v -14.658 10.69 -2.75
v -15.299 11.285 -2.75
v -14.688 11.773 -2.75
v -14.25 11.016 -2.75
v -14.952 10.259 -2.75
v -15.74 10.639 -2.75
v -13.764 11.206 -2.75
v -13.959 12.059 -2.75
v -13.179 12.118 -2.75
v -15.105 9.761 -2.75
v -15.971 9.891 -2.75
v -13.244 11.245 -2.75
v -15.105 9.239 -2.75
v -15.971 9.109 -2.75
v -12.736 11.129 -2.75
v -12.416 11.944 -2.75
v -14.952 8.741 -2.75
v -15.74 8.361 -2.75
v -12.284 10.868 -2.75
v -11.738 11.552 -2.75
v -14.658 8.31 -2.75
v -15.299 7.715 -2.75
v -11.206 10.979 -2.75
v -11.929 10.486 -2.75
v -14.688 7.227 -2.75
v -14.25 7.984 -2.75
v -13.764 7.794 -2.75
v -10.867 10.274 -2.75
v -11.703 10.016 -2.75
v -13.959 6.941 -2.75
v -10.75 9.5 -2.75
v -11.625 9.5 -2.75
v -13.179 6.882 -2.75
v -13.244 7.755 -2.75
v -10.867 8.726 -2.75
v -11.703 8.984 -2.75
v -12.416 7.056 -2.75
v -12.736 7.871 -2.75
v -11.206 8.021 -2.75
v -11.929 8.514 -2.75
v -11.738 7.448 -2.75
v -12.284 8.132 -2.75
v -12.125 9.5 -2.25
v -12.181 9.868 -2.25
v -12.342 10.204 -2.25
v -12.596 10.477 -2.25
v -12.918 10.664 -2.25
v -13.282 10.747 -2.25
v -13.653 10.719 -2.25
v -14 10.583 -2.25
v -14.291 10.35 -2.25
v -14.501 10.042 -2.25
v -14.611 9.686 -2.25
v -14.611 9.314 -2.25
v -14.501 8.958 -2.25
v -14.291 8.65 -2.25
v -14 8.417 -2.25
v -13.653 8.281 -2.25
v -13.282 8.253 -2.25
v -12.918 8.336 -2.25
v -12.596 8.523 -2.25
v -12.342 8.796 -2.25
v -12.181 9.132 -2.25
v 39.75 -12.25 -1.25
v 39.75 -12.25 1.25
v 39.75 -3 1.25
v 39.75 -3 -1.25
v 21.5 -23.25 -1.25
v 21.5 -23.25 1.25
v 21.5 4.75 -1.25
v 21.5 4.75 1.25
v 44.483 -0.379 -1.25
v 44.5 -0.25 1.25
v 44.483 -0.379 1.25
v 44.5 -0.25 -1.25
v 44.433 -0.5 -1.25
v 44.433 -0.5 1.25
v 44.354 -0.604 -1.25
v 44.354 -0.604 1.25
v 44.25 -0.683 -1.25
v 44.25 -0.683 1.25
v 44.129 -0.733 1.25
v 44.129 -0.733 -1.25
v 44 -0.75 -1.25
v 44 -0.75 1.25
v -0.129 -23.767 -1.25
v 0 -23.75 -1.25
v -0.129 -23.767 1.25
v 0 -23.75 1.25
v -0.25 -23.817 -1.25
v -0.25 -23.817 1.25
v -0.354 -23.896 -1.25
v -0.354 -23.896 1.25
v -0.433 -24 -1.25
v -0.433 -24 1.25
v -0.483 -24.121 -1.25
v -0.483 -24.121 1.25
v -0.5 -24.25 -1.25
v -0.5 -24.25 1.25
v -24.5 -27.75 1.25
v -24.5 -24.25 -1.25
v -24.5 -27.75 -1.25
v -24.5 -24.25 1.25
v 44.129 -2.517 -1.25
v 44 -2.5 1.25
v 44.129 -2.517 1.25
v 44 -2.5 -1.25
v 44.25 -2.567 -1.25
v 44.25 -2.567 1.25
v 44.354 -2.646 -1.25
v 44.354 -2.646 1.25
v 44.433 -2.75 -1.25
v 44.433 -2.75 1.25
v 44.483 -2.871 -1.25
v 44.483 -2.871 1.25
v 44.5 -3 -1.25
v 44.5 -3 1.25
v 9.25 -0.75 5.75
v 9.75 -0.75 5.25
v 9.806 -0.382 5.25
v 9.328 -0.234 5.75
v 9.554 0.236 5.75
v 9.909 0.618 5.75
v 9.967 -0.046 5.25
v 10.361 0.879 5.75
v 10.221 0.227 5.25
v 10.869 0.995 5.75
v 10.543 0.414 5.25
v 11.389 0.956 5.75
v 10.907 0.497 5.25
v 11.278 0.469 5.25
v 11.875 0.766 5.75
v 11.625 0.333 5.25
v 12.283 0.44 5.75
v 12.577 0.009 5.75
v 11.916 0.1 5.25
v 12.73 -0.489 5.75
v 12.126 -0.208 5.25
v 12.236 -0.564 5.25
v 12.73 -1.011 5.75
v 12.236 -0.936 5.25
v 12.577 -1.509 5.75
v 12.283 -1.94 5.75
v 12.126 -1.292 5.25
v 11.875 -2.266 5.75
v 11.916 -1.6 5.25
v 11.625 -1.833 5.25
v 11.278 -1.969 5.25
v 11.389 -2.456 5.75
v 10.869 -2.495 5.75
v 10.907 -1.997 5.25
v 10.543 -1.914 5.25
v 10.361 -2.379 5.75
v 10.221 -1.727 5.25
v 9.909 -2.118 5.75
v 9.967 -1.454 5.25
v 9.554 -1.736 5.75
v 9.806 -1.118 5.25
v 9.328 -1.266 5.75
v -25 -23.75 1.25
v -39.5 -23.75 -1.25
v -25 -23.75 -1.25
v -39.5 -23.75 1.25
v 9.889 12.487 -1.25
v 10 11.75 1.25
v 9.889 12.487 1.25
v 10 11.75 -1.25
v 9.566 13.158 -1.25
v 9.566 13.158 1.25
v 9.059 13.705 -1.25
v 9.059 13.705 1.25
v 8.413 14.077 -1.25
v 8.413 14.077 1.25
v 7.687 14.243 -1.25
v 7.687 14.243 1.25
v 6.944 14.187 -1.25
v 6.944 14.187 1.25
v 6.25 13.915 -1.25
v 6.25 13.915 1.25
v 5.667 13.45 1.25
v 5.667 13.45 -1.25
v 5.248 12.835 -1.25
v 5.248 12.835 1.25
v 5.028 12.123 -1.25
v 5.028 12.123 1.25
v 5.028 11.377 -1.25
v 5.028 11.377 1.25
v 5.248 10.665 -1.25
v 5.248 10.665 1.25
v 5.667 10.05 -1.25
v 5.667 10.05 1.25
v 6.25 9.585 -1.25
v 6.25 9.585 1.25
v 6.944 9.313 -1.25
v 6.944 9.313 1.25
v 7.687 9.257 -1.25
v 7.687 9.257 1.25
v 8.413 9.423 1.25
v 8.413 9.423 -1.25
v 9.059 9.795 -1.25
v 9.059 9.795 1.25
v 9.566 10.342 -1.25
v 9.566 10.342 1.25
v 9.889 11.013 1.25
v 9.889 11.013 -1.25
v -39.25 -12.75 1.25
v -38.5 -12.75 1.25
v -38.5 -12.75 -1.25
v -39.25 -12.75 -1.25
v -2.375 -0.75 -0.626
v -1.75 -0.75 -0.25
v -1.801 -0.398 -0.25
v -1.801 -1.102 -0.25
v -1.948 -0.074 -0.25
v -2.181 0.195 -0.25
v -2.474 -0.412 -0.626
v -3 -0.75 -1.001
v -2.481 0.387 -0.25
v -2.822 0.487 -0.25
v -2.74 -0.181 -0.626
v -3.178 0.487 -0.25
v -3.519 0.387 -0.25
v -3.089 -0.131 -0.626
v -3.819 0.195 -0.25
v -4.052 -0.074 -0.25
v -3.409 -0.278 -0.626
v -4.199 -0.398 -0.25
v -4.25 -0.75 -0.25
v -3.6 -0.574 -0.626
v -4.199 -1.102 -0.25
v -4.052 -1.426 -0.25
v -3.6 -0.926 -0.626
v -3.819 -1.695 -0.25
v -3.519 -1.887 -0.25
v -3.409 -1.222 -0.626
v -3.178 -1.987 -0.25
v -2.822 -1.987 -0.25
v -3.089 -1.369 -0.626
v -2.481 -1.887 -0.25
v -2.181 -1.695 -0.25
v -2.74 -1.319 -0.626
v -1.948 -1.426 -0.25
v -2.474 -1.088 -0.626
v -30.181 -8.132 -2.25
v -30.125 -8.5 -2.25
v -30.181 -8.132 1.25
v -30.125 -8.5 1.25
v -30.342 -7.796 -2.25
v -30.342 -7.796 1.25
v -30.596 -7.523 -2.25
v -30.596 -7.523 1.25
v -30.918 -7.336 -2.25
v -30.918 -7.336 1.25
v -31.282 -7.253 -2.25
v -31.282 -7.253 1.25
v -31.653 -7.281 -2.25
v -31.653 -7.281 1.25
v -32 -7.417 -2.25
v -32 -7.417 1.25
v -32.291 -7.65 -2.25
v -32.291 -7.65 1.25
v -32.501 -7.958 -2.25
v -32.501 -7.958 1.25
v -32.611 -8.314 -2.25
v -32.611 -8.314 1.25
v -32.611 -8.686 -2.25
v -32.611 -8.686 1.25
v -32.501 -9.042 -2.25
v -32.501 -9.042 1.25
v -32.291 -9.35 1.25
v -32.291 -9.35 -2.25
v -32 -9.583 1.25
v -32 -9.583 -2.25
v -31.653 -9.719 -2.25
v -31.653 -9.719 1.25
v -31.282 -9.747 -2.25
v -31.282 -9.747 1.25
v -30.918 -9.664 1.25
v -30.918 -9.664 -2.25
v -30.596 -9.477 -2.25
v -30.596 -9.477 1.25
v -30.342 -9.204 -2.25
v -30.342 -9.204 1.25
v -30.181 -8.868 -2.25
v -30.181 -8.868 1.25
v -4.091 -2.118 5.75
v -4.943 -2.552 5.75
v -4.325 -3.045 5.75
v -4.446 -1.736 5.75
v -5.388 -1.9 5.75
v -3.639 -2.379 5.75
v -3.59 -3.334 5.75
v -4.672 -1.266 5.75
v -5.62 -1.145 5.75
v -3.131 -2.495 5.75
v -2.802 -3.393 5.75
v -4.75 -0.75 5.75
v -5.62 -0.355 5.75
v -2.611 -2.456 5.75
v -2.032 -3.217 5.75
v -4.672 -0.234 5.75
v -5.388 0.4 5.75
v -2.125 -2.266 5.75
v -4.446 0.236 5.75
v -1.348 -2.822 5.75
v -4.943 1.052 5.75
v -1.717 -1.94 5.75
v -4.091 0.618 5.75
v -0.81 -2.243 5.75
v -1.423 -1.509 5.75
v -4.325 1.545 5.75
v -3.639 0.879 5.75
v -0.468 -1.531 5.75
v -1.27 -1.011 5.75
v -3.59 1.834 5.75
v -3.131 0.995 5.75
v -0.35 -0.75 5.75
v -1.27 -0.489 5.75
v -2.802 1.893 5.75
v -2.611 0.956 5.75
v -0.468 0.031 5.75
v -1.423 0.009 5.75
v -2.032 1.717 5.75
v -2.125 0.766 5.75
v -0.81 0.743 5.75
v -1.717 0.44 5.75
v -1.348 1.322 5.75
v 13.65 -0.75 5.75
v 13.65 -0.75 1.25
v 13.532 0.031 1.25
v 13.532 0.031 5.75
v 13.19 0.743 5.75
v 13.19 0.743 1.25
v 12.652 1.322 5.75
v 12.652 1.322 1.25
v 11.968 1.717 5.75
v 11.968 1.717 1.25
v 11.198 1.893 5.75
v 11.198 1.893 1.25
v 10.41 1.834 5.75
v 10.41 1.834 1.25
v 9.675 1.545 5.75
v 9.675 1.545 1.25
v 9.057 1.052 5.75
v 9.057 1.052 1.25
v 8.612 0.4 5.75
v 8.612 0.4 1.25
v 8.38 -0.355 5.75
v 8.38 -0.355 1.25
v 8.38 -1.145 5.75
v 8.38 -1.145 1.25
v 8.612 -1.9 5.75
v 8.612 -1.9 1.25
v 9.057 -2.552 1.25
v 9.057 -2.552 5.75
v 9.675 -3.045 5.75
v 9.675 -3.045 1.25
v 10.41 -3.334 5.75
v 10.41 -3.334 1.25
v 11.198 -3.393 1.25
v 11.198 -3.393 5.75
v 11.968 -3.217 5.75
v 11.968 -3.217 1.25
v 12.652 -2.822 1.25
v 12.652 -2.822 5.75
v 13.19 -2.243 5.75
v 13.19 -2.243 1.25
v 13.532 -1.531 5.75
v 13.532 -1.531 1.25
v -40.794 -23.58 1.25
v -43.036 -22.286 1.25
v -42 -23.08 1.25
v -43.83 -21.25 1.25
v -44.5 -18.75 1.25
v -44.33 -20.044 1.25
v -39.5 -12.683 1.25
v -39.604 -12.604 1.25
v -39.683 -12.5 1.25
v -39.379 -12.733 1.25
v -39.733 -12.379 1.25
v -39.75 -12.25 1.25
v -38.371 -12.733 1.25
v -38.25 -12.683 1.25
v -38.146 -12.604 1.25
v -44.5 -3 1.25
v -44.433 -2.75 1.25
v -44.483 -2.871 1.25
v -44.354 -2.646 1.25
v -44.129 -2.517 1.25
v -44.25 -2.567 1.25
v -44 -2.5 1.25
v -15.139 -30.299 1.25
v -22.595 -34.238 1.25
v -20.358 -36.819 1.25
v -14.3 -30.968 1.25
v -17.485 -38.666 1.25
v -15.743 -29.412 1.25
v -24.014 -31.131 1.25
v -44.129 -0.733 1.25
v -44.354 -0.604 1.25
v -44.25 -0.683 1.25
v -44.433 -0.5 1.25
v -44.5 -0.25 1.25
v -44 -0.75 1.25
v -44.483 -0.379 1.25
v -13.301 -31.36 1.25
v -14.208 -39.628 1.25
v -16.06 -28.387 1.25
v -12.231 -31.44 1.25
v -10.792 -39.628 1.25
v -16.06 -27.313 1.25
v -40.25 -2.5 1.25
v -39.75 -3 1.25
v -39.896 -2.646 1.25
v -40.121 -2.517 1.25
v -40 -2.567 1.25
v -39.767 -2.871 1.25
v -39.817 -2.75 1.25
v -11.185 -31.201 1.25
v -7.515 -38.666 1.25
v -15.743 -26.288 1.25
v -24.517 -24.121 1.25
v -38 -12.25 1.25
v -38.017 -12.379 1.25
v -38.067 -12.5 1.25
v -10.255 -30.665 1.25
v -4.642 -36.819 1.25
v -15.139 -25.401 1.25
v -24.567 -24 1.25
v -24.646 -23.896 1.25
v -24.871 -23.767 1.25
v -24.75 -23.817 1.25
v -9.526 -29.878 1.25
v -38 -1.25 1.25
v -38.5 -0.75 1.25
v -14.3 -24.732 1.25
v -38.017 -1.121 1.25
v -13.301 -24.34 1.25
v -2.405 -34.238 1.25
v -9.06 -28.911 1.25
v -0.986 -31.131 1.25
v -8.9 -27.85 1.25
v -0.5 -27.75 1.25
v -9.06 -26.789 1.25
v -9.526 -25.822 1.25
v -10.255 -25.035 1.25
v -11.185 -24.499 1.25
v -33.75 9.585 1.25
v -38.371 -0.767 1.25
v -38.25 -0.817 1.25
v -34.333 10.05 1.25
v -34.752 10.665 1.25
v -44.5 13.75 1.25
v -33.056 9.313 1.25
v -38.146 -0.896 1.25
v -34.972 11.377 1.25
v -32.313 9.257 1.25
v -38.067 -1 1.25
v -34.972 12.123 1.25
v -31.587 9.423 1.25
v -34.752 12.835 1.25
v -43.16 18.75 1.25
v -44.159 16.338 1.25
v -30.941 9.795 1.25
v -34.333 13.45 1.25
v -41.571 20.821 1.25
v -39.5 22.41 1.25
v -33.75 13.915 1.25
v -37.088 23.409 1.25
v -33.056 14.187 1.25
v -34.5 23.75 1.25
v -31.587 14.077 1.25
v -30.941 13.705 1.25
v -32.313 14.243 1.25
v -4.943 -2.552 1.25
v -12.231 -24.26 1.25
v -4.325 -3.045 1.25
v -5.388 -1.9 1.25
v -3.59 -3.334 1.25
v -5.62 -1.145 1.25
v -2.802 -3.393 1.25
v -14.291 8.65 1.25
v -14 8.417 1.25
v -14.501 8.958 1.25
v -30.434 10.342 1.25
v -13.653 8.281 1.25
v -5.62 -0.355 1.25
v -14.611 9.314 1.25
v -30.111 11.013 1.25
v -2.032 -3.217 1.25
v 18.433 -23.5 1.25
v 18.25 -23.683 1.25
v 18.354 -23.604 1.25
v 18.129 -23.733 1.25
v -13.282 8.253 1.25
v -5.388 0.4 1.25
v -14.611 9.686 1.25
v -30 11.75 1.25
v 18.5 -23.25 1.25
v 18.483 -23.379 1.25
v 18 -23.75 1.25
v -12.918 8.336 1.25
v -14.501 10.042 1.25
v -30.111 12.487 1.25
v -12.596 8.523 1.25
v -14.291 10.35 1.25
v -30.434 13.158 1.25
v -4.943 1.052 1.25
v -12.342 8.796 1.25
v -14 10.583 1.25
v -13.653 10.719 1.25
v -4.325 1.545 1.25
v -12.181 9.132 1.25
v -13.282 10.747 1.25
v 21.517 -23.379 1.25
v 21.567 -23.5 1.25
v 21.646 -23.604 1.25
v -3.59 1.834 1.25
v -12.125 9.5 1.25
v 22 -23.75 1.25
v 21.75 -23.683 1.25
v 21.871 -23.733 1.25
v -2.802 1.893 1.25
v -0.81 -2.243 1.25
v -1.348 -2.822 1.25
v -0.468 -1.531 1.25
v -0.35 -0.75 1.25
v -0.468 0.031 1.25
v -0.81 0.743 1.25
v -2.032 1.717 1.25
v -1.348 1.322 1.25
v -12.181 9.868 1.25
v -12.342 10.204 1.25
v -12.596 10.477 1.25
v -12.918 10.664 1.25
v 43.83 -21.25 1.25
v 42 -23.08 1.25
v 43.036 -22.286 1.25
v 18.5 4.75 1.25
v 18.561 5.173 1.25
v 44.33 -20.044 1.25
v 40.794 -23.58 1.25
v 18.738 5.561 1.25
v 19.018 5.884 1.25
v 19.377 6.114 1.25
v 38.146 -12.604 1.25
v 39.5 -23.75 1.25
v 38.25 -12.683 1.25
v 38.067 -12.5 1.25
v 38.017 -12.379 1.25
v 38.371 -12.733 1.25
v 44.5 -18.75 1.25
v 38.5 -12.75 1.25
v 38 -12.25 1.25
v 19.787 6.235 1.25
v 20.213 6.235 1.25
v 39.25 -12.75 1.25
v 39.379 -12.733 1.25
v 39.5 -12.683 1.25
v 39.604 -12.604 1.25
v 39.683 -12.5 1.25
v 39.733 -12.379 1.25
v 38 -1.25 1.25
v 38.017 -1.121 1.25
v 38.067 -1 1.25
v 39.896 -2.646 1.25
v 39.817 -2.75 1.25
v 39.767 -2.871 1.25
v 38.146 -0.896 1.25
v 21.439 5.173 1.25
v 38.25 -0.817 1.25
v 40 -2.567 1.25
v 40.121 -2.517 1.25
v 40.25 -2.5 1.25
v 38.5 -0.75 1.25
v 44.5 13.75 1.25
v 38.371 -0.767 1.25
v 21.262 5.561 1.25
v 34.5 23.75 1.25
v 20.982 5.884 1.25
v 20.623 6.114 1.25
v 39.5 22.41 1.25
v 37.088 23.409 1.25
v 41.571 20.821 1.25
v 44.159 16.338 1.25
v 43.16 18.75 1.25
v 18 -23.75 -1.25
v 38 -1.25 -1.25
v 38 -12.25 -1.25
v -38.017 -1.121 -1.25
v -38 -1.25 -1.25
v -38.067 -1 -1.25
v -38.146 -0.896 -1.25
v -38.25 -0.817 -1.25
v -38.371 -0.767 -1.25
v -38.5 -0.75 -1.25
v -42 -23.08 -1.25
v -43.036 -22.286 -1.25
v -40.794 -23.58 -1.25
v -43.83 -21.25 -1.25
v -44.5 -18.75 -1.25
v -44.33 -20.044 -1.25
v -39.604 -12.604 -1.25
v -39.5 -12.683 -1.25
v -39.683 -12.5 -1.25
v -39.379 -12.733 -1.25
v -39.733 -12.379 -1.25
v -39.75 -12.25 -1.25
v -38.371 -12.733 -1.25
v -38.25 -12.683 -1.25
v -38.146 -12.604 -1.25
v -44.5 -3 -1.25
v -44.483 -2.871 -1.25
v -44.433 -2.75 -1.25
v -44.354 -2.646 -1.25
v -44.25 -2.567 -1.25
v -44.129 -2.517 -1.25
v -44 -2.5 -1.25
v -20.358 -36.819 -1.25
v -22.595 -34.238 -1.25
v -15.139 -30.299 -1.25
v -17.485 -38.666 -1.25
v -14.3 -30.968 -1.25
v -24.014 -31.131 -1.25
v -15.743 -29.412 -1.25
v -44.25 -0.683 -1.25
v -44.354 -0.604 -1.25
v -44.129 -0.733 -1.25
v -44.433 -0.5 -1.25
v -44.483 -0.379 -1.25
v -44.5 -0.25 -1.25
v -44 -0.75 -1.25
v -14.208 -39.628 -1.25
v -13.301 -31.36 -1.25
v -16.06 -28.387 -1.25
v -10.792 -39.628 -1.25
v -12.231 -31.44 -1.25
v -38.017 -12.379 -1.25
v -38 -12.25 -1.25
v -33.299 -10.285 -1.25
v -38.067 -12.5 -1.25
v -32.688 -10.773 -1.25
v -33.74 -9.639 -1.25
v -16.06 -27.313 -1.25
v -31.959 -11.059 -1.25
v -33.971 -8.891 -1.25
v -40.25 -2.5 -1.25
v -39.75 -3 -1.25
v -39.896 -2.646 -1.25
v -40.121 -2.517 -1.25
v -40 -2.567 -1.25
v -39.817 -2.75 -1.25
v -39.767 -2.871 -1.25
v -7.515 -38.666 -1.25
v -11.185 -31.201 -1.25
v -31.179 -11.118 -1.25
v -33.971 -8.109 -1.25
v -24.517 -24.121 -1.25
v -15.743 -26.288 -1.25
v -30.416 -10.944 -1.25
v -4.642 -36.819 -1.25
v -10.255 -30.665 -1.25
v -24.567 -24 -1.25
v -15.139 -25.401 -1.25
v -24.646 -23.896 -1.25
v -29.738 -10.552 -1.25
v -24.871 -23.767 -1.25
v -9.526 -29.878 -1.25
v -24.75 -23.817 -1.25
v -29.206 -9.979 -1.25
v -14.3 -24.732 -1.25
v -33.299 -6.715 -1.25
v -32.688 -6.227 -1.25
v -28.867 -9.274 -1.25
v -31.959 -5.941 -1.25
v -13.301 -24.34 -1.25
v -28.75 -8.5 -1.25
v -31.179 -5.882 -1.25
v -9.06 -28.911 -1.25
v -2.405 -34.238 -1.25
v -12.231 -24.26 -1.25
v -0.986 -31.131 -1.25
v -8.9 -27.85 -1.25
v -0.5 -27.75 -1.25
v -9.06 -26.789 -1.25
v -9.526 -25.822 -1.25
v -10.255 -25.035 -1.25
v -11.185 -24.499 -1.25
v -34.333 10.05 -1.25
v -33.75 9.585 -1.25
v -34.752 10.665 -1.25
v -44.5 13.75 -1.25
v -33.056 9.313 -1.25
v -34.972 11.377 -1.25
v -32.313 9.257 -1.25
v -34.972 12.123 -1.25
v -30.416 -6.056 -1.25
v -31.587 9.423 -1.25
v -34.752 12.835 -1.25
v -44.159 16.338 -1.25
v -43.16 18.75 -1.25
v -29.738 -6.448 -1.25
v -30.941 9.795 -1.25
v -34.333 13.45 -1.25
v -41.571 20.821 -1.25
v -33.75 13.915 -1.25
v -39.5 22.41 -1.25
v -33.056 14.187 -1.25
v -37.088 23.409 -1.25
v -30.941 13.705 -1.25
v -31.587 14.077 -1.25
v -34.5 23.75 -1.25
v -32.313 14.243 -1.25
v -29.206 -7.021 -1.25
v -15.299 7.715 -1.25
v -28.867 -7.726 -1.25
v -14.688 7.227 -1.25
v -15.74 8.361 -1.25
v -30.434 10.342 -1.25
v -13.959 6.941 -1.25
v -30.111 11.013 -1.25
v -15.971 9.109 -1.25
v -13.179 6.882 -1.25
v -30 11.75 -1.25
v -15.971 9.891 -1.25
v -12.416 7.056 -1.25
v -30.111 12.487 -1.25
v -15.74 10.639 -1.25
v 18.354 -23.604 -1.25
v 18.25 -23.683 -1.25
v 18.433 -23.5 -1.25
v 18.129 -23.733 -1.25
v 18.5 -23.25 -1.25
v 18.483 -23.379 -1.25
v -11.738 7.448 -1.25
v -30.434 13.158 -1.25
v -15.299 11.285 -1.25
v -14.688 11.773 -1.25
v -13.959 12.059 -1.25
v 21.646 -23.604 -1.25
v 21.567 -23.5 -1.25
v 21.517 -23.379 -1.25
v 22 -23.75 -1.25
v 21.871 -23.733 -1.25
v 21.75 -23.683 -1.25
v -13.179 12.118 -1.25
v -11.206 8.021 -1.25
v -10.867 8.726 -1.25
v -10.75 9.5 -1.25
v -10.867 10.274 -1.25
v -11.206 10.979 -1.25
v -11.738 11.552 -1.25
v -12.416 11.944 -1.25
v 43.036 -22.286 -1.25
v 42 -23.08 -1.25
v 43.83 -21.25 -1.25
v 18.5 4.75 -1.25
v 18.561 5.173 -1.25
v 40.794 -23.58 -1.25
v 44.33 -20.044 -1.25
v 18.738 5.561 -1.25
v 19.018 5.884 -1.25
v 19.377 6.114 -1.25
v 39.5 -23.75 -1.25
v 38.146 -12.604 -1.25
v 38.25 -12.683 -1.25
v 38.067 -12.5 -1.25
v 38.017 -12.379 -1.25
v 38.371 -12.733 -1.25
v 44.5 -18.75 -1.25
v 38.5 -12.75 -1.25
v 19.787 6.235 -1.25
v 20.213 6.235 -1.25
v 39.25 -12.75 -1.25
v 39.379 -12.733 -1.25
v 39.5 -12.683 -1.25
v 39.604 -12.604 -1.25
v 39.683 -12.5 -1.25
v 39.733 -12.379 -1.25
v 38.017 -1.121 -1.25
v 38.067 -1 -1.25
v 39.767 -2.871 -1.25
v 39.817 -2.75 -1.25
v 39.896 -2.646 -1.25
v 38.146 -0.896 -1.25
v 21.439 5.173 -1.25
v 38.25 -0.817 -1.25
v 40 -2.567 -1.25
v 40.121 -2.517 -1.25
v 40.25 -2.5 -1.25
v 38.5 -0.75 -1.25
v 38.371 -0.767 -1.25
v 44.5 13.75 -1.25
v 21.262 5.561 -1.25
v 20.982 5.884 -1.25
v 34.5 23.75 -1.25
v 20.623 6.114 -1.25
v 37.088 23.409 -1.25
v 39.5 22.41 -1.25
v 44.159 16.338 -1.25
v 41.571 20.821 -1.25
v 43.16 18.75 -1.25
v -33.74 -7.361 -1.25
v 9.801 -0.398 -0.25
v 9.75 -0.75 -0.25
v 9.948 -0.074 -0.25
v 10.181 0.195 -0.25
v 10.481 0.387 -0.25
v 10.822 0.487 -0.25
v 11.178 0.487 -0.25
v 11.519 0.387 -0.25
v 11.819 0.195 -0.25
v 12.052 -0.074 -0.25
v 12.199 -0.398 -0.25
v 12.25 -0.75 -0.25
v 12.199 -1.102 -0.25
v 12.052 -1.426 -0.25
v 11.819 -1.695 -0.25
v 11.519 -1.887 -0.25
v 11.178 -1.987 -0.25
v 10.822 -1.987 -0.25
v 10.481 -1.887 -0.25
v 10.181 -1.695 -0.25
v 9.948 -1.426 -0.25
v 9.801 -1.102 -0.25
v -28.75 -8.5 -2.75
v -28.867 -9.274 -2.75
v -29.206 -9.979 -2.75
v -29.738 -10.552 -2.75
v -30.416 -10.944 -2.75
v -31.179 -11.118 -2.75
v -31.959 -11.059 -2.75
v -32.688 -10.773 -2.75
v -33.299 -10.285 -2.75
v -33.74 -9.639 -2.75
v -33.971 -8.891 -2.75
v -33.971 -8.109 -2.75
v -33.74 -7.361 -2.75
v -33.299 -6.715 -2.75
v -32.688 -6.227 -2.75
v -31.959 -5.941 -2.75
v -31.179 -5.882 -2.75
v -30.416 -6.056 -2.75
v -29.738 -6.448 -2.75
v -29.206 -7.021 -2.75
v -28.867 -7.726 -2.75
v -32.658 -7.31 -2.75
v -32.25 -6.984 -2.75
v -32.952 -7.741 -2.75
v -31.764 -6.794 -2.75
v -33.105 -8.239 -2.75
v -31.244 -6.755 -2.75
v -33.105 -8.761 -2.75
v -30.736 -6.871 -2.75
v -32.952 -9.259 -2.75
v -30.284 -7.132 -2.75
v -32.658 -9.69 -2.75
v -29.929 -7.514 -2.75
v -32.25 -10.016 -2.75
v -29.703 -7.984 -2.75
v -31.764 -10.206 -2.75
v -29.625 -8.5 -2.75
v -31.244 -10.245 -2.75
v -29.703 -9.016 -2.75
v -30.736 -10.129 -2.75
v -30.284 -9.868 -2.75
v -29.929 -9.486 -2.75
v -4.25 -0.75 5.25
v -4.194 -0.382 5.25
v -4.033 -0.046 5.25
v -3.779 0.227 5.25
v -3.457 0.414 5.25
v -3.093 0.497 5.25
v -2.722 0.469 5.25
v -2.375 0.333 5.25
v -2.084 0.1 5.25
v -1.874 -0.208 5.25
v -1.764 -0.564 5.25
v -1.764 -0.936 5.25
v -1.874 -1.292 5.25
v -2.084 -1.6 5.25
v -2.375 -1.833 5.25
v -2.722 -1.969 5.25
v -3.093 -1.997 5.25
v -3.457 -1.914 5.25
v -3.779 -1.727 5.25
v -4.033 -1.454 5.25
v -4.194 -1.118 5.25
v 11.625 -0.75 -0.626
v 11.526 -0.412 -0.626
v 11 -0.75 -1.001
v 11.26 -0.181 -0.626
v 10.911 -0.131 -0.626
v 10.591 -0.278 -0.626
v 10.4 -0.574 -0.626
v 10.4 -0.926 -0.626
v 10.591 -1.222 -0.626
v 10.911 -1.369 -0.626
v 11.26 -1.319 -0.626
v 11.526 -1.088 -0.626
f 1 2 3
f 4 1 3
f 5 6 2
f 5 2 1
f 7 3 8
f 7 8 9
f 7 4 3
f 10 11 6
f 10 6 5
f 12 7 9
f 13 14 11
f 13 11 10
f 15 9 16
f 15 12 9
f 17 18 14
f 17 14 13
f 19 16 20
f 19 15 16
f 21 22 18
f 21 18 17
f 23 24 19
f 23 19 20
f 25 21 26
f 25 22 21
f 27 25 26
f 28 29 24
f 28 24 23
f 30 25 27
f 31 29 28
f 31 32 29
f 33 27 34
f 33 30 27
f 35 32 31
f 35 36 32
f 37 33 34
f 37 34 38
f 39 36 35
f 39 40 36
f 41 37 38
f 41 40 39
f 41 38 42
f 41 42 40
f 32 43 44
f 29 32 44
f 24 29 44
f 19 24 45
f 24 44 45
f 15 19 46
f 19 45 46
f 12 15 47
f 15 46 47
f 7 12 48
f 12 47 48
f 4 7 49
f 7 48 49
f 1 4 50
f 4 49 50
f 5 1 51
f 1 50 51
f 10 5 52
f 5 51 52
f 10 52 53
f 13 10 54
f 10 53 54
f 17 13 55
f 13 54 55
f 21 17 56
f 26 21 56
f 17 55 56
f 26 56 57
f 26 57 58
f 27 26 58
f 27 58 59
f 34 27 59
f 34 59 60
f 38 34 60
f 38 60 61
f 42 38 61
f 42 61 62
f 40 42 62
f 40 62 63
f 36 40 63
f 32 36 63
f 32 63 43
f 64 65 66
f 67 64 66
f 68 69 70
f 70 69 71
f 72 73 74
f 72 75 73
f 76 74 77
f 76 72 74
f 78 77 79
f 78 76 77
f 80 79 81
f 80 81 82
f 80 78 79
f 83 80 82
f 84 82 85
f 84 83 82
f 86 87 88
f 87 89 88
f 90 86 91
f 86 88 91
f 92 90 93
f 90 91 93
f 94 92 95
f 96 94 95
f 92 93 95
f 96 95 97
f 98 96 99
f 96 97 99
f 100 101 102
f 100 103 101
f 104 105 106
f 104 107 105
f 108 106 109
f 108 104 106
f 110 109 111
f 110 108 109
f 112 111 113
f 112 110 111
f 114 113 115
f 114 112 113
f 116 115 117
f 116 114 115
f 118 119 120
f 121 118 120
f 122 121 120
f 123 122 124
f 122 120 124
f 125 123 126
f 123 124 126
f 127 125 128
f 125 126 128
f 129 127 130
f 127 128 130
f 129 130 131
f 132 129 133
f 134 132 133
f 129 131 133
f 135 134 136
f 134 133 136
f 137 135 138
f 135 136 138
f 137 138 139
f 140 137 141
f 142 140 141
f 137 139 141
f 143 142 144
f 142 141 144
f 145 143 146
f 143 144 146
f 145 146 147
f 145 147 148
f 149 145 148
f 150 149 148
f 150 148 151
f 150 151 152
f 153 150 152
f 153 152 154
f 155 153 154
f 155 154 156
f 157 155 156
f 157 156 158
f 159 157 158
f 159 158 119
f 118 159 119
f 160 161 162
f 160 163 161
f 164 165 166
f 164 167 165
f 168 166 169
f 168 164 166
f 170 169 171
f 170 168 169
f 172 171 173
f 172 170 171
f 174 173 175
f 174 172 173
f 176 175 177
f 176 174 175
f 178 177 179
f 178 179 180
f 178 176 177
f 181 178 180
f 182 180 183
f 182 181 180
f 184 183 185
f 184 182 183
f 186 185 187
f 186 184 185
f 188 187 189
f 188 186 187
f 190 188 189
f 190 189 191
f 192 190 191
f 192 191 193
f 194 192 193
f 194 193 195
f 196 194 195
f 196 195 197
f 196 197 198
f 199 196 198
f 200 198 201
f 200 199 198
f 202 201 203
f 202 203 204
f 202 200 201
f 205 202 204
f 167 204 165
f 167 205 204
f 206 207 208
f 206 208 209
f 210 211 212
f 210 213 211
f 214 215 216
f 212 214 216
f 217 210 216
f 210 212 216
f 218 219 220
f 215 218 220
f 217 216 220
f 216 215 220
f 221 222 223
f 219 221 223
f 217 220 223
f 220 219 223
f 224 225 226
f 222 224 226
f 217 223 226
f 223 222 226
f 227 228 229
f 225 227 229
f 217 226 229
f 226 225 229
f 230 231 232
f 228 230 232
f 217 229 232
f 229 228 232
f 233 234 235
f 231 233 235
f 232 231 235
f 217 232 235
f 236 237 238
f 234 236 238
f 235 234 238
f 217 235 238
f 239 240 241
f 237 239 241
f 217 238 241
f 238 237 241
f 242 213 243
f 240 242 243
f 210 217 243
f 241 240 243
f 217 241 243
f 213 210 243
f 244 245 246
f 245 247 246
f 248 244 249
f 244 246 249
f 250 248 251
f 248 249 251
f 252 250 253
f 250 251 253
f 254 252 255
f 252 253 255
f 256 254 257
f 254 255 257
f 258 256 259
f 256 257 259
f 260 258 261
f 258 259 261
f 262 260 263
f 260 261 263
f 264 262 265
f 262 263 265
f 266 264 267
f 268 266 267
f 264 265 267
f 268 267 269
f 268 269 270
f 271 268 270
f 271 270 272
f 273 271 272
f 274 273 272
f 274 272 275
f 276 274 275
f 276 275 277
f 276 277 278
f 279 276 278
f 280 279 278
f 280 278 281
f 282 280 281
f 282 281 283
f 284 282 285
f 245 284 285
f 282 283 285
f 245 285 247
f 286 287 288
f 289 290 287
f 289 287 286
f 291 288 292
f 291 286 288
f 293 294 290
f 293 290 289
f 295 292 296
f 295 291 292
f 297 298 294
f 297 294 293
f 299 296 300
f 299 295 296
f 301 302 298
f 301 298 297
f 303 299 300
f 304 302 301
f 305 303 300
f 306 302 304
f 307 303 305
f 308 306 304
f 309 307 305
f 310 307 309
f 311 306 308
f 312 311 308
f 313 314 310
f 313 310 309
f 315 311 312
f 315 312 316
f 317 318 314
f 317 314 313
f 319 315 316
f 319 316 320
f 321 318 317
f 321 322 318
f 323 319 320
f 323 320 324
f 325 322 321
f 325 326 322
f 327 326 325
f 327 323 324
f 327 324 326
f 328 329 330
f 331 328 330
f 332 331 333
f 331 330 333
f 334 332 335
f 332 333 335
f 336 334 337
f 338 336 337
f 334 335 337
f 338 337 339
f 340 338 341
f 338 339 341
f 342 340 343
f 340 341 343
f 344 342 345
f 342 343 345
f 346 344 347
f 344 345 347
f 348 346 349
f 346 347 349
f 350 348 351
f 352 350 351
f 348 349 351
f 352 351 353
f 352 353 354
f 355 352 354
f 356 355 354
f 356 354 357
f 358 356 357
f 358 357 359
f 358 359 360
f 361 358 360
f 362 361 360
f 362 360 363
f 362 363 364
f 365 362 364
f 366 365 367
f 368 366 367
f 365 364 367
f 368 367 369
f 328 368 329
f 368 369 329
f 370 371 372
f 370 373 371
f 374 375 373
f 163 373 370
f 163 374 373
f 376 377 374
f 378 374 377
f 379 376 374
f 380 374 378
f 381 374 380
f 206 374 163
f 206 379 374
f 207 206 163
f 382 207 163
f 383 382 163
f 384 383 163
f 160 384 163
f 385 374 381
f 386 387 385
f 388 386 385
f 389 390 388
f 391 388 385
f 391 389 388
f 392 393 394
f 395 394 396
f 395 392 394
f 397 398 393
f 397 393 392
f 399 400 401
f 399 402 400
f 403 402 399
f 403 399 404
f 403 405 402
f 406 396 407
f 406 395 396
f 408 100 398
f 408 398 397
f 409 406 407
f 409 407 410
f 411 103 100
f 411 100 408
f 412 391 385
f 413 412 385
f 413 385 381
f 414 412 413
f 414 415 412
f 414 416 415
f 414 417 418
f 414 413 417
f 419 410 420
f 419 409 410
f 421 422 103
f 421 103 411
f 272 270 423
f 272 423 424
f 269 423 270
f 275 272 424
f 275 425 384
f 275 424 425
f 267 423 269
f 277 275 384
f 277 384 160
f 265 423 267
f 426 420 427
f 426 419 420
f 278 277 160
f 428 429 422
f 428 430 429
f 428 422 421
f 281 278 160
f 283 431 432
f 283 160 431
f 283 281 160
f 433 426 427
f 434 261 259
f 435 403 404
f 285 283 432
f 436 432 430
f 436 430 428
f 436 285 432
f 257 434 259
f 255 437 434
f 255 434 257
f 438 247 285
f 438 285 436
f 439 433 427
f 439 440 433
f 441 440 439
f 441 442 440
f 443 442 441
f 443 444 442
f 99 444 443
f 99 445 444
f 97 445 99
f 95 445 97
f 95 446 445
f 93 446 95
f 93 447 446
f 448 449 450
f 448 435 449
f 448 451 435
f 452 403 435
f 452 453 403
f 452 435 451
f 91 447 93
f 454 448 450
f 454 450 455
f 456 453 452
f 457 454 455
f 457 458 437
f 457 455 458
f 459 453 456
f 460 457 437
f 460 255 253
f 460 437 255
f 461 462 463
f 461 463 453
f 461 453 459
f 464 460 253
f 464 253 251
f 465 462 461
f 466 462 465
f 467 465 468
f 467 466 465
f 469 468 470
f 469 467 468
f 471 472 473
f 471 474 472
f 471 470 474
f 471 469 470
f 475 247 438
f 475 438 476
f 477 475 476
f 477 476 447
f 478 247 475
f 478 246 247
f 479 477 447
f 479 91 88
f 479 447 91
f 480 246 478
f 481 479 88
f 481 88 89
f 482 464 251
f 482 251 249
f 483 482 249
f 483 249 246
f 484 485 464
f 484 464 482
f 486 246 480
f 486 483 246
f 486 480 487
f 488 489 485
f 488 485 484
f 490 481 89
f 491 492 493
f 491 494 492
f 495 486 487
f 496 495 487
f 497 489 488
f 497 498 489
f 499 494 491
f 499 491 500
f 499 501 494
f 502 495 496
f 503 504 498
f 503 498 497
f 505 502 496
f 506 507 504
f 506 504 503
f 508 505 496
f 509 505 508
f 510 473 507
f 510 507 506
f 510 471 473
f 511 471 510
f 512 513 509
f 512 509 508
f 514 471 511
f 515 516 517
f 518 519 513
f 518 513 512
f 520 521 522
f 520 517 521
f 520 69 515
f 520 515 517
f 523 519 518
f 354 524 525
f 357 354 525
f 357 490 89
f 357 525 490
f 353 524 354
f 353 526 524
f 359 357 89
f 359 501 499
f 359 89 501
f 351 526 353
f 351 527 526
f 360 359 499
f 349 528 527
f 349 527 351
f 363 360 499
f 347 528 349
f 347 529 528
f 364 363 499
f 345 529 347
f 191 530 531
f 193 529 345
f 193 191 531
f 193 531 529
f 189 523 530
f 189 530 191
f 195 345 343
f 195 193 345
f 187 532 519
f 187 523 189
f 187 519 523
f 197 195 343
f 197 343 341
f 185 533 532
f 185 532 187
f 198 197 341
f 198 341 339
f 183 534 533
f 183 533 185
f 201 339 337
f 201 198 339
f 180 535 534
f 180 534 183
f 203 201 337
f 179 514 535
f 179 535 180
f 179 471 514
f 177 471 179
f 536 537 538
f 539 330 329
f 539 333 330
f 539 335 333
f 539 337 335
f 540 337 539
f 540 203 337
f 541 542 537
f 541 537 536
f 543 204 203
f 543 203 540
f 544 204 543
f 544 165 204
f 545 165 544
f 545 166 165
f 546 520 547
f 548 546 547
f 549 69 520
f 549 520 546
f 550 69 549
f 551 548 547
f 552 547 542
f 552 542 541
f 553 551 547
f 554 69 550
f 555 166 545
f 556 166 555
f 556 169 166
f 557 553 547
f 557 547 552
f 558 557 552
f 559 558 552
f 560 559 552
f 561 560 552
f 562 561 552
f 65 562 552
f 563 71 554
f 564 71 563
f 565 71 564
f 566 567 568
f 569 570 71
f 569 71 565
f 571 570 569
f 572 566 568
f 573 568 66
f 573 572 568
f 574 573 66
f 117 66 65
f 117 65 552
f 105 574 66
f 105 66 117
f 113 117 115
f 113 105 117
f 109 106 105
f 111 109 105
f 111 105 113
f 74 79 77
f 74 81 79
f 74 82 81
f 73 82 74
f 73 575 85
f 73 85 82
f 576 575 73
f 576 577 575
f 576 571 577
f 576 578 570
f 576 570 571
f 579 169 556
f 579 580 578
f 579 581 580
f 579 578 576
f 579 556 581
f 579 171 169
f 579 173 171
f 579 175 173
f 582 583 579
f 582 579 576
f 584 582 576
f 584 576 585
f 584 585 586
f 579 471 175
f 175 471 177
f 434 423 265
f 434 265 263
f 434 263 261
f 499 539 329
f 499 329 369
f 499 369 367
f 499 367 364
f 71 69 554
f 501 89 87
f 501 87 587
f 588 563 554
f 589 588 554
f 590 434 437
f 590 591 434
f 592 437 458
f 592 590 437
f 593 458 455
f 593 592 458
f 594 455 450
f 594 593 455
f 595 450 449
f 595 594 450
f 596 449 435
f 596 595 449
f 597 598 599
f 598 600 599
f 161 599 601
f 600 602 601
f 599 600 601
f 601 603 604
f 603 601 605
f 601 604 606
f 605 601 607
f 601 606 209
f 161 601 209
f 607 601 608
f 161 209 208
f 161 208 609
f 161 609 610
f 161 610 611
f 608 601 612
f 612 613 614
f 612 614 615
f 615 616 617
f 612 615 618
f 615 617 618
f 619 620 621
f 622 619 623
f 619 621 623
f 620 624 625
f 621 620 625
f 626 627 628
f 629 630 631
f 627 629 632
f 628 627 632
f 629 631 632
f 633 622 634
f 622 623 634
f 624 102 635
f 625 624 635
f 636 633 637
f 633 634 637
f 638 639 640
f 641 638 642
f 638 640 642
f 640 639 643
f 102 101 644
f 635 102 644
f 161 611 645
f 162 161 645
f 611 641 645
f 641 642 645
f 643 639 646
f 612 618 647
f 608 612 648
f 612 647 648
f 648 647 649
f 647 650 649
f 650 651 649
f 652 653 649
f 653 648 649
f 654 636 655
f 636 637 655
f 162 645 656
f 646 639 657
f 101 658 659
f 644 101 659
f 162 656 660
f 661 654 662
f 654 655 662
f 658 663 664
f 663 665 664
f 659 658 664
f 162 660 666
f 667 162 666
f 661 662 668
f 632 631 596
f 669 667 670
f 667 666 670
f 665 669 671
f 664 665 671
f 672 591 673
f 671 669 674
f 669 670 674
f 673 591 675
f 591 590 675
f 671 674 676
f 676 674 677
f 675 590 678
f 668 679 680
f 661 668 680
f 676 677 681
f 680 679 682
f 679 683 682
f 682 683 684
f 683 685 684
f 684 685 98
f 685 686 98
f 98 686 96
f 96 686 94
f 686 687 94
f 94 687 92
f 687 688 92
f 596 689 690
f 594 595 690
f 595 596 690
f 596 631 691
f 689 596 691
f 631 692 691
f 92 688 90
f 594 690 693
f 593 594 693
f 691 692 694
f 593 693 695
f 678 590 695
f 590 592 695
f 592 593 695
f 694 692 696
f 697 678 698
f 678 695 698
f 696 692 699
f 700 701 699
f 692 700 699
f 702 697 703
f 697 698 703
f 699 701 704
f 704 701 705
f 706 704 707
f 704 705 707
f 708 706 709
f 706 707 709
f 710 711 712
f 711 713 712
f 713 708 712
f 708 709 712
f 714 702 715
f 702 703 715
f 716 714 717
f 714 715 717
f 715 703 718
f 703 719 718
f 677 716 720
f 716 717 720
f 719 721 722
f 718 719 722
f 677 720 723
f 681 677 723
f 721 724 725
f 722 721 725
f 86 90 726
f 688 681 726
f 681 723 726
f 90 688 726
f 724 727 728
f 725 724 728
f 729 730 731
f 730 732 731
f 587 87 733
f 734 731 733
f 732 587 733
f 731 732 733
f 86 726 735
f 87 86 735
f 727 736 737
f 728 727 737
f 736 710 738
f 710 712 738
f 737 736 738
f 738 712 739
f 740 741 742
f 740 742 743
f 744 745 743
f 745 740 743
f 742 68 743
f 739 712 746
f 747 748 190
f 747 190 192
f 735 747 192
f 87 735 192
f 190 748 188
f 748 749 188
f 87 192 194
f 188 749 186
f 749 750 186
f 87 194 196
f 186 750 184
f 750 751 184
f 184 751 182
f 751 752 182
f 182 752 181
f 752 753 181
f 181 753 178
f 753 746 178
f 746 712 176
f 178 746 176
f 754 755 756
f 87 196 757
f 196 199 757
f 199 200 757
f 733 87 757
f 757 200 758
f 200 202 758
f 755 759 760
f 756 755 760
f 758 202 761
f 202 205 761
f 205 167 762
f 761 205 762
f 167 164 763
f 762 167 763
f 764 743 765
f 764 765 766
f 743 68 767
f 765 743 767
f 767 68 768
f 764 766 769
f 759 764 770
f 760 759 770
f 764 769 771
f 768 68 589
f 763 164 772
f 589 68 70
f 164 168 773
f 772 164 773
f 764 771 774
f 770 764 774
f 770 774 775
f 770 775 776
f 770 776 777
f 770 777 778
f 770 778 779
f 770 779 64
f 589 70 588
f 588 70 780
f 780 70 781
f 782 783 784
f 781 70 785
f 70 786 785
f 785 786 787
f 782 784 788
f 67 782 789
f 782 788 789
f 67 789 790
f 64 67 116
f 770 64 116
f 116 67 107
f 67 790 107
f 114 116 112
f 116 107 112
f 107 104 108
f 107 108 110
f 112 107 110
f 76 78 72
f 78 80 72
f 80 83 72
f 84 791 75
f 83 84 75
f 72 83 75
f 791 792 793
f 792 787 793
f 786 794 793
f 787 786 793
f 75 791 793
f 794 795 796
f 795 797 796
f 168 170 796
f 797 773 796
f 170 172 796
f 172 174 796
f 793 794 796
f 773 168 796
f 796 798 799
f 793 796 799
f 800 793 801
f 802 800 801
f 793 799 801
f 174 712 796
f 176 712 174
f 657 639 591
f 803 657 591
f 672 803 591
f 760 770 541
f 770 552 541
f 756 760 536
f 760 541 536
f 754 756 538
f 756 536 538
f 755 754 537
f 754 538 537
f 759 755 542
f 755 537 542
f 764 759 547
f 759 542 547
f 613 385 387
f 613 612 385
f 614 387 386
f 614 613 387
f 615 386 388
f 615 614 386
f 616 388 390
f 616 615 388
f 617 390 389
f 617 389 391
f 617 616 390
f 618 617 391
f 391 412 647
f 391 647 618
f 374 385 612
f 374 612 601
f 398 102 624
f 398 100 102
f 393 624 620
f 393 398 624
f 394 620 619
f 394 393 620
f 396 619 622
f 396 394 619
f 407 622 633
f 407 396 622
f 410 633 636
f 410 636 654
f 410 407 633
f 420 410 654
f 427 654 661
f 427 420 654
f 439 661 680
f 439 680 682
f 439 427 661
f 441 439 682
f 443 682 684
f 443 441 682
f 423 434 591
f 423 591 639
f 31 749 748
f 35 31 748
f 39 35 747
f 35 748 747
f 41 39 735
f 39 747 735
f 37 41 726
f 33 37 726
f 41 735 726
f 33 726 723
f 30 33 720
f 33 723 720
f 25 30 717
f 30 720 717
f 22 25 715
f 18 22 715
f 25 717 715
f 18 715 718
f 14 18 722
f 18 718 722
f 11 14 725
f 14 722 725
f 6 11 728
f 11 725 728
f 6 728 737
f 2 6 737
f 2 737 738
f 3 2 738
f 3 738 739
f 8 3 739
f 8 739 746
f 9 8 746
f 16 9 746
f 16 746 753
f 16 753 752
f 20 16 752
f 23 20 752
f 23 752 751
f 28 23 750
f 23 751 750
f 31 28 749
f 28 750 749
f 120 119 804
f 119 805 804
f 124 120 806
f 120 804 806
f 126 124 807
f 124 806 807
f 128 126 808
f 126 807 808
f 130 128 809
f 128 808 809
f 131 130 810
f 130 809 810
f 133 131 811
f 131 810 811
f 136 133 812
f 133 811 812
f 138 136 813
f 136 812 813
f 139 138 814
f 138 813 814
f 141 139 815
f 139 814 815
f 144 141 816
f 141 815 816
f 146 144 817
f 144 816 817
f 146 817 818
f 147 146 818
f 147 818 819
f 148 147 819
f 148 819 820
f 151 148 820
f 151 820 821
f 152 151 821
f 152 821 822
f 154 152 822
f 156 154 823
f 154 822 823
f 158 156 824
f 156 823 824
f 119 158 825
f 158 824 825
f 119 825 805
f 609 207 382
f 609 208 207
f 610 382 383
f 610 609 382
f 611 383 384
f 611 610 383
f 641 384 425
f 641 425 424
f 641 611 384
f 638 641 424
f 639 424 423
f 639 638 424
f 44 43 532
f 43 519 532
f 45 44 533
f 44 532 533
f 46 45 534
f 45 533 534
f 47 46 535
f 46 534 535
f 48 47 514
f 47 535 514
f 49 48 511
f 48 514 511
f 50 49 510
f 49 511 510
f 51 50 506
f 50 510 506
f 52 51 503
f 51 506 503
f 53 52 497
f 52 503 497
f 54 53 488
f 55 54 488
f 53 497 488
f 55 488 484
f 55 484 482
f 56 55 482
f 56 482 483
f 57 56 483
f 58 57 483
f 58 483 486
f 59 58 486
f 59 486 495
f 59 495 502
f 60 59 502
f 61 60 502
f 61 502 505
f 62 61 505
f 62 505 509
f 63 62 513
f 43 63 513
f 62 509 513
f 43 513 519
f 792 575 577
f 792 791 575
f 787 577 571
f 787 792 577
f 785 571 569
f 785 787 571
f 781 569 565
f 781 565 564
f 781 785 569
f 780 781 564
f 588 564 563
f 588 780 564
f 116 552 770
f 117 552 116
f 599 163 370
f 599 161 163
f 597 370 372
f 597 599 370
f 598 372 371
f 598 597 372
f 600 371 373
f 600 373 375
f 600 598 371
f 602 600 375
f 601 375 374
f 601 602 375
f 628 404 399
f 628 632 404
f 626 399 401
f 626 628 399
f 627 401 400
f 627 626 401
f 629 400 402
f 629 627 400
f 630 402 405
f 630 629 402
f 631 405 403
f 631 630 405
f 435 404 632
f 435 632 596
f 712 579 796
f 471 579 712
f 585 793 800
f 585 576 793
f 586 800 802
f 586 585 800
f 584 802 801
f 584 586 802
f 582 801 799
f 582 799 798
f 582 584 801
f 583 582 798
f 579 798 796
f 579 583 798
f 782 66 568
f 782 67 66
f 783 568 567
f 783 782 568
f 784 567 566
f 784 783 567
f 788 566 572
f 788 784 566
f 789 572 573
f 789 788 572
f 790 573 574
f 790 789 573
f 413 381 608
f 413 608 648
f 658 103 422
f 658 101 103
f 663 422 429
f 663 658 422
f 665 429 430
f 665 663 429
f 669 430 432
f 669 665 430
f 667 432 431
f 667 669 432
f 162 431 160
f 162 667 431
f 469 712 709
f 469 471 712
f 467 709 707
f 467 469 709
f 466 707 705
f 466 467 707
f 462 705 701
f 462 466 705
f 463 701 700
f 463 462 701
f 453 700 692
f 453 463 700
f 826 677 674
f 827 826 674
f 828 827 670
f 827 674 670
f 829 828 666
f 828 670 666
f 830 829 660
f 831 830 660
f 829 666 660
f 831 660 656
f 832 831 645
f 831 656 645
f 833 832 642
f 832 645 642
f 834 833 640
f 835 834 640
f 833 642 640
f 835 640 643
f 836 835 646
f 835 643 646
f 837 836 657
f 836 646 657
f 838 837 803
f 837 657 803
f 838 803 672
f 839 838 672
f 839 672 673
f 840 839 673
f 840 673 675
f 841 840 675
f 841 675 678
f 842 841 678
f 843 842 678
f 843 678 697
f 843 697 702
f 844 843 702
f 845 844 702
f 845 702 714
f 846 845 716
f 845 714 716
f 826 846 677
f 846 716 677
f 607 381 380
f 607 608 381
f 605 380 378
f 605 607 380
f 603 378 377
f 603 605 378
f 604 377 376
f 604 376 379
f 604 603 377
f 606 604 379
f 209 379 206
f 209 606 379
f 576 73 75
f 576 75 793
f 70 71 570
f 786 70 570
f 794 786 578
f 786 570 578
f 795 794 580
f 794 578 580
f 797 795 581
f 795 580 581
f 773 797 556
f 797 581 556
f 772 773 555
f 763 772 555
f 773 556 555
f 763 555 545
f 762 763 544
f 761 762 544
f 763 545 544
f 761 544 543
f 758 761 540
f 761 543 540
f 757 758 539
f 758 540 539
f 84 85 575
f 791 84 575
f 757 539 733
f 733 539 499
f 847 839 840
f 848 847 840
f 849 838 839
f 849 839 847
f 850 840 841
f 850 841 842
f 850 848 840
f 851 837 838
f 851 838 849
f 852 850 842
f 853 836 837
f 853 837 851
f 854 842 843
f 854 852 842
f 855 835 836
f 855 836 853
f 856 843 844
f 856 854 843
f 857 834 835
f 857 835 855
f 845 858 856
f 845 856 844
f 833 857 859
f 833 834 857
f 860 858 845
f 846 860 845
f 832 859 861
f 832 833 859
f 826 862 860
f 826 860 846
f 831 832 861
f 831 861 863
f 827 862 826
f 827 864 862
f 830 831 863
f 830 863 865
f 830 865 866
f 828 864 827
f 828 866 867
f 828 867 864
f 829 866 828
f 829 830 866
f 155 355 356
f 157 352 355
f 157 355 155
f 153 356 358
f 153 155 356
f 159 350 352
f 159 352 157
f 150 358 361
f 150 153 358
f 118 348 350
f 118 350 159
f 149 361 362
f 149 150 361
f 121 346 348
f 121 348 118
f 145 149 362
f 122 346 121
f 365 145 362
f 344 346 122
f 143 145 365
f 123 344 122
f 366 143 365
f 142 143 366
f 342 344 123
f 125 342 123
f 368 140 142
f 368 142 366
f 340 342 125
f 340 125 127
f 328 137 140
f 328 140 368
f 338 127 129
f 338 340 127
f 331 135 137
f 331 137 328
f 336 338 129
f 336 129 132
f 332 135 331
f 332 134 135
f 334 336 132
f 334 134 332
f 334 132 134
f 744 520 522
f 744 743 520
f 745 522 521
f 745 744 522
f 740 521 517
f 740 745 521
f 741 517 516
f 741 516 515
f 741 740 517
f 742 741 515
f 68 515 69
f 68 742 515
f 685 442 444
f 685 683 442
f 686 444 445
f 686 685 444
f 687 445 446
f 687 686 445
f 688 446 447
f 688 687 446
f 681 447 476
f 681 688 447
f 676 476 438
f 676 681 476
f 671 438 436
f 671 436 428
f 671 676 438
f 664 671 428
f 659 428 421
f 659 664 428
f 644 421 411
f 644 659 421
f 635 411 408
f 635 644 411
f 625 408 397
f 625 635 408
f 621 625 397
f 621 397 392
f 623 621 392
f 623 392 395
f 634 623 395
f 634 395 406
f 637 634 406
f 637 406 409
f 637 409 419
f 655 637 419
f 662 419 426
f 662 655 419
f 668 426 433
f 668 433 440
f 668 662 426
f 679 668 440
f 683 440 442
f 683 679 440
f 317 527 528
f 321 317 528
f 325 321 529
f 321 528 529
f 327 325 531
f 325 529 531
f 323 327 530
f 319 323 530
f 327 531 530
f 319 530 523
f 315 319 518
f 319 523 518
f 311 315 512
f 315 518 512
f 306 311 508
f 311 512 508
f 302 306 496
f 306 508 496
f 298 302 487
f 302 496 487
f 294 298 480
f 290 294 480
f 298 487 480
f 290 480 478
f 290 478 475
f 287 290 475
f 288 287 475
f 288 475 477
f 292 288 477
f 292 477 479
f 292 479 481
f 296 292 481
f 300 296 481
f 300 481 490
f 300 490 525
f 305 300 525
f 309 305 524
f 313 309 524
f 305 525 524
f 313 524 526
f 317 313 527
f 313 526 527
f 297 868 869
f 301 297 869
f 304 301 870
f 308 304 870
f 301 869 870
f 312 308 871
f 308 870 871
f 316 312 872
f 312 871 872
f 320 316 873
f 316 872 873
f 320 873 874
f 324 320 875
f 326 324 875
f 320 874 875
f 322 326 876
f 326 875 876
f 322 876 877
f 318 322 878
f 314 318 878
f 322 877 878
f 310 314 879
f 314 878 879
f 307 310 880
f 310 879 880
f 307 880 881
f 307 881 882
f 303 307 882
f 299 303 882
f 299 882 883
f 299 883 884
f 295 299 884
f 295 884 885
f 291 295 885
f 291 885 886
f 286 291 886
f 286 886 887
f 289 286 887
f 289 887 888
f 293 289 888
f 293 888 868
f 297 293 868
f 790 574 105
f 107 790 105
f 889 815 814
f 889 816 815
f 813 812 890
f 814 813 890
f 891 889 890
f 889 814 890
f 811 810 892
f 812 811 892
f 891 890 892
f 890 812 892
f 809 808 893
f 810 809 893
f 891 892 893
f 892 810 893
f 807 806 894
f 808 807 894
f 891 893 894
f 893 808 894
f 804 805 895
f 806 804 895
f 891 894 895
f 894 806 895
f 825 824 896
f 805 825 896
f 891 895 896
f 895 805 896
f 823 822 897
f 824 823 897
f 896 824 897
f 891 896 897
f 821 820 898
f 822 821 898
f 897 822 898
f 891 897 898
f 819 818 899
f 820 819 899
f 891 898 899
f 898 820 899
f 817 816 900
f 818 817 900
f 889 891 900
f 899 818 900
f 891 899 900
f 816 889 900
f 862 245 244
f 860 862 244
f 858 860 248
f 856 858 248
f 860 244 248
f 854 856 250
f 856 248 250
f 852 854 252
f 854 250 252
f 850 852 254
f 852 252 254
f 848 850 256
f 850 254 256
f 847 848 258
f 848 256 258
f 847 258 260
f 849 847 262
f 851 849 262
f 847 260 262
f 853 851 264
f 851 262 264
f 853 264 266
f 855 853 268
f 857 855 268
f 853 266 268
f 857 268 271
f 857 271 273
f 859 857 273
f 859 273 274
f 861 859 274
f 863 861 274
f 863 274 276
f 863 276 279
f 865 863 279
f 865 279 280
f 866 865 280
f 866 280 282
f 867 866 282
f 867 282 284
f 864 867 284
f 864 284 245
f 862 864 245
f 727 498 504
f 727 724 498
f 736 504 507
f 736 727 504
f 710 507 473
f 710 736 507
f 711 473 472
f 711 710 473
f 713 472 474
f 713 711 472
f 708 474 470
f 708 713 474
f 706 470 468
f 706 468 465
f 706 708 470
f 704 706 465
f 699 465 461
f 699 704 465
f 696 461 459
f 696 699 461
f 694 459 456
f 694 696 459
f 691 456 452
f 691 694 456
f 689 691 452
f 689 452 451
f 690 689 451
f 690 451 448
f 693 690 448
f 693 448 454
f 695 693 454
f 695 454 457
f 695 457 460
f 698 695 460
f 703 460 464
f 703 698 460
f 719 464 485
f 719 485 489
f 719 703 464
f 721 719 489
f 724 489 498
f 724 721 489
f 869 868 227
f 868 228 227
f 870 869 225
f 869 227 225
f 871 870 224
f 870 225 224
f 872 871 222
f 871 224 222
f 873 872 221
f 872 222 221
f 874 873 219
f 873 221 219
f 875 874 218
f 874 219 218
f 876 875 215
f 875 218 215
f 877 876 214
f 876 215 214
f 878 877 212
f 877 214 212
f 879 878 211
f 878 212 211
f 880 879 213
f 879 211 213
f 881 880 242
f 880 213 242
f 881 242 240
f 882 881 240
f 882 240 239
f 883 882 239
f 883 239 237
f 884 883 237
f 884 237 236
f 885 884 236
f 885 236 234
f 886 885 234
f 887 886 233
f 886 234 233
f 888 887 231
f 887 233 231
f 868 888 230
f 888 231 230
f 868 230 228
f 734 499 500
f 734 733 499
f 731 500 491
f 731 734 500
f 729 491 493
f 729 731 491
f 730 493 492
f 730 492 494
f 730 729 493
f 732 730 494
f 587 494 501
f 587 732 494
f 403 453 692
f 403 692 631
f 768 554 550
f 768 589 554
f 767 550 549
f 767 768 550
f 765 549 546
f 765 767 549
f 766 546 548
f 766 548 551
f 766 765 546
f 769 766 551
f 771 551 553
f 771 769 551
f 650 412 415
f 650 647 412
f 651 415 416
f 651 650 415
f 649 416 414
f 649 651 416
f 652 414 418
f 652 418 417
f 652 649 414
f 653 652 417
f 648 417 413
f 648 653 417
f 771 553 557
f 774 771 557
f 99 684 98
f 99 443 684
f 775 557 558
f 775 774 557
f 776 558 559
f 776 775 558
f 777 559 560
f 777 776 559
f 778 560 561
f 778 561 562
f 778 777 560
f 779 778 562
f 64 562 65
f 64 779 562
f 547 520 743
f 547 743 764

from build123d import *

# Parameters (mm, degrees)
SKETCH1_R                       = 3.6
SKETCH1_R_2                     = 2.5
BOSS_EXTRUDE1_DEPTH             = 1.25
FILLET1_R                       = 5
FILLET2_R                       = 10
CUT_EXTRUDE1_DEPTH              = 60.720704115
FILLET3_R                       = 0.5
SKETCH3_R                       = 2.65
BOSS_EXTRUDE2_DEPTH             = 4.5
M3X0_5_TAPPED_HOLE1_D           = 2.5
M3X0_5_TAPPED_HOLE1_DEPTH       = 6
M3X0_5_TAPPED_HOLE1_CSINK_D     = 3.5
M3X0_5_TAPPED_HOLE1_CSINK_ANGLE = 90
M3X0_5_TAPPED_HOLE1_TIP         = 0.751075774
SKETCH7_R                       = 2.625
BOSS_EXTRUDE3_DEPTH             = 1.5
M3X0_5_TAPPED_HOLE2_D           = 2.5
M3X0_5_TAPPED_HOLE2_CSINK_D     = 3.5
M3X0_5_TAPPED_HOLE2_CSINK_ANGLE = 90


with BuildPart() as part:
    # Sketch1 → Boss-Extrude1 (new, symmetric)
    with BuildSketch(Plane.XY):
        with BuildLine():
            Line((-0.5, -27.75), (-0.5, -23.75))
            Line((-0.5, -23.75), (44.5, -23.75))
            Line((44.5, -23.75), (44.5, 23.75))
            Line((44.5, 23.75), (-44.5, 23.75))
            Line((-44.5, 23.75), (-44.5, -23.75))
            Line((-44.5, -23.75), (-24.5, -23.75))
            Line((-24.5, -23.75), (-24.5, -27.75))
            ThreePointArc((-24.5, -27.75), (-12.5, -39.75), (-0.5, -27.75))
        make_face()
        with Locations((-12.5, -27.85)):
            Circle(SKETCH1_R, mode=Mode.SUBTRACT)
        with Locations((7.5, 11.75)):
            Circle(SKETCH1_R_2, mode=Mode.SUBTRACT)
        with Locations((-32.5, 11.75)):
            Circle(SKETCH1_R_2, mode=Mode.SUBTRACT)
    extrude(amount=BOSS_EXTRUDE1_DEPTH, both=True)

    # Fillet1
    fillet1_edges = [part.edges().sort_by_distance(p)[0] for p in [
        (44.5, -23.75, 0),
        (-44.5, -23.75, 0),
    ]]
    fillet(fillet1_edges, radius=FILLET1_R)

    # Fillet2
    fillet2_edges = [part.edges().sort_by_distance(p)[0] for p in [
        (-44.5, 23.75, 0),
        (44.5, 23.75, 0),
    ]]
    fillet(fillet2_edges, radius=FILLET2_R)

    # Sketch2 → Cut-Extrude1 (cut, through all)
    with BuildSketch(Plane.XY.offset(1.25)):
        with BuildLine():
            Line((18.5, -23.75), (21.5, -23.75))
            Line((21.5, -23.75), (21.5, 4.75))
            ThreePointArc((21.5, 4.75), (20, 6.25), (18.5, 4.75))
            Line((18.5, 4.75), (18.5, -23.75))
        make_face()
        Polygon((44.5, -0.75), (38, -0.75), (38, -12.75), (39.75, -12.75), (39.75, -2.5), (44.5, -2.5), align=None)
        Polygon((-38, -12.75), (-39.75, -12.75), (-39.75, -2.5), (-44.5, -2.5), (-44.5, -0.75), (-38, -0.75), align=None)
    extrude(amount=-CUT_EXTRUDE1_DEPTH, mode=Mode.SUBTRACT)

    # Fillet3
    fillet3_edges = [part.edges().sort_by_distance(p)[0] for p in [
        (-0.5, -23.75, 0),
        (-24.5, -23.75, 0),
        (44.5, -0.75, 0),
        (44.5, -2.5, 0),
        (39.75, -2.5, 0),
        (39.75, -12.75, 0),
        (38, -12.75, 0),
        (38, -0.75, 0),
        (-38, -0.75, 0),
        (-38, -12.75, 0),
        (-39.75, -12.75, 0),
        (-39.75, -2.5, 0),
        (-44.5, -2.5, 0),
        (-44.5, -0.75, 0),
        (18.5, -23.75, 0),
        (21.5, -23.75, 0),
    ]]
    fillet(fillet3_edges, radius=FILLET3_R)

    # Sketch3 → Boss-Extrude2 (add)
    with BuildSketch(Plane.XY.offset(1.25)):
        with Locations((11, -0.75)):
            Circle(SKETCH3_R)
        with Locations((-3, -0.75)):
            Circle(SKETCH3_R)
    extrude(amount=BOSS_EXTRUDE2_DEPTH)

    # M3x0.5 Tapped Hole1
    with Locations(Plane.XY.offset(5.75)):
        with Locations((-3, -0.75), (11, -0.75)):
            CounterSinkHole(M3X0_5_TAPPED_HOLE1_D / 2, M3X0_5_TAPPED_HOLE1_CSINK_D / 2, depth=M3X0_5_TAPPED_HOLE1_DEPTH, counter_sink_angle=M3X0_5_TAPPED_HOLE1_CSINK_ANGLE)
            with Locations((0, 0, -(M3X0_5_TAPPED_HOLE1_DEPTH + M3X0_5_TAPPED_HOLE1_TIP / 2))):  # 118° drill point
                Cone(0, M3X0_5_TAPPED_HOLE1_D / 2, M3X0_5_TAPPED_HOLE1_TIP, mode=Mode.SUBTRACT)

    # Sketch7 → Boss-Extrude3 (add)
    with BuildSketch(Plane(origin=(0, 0, -1.25), x_dir=(-1, 0, 0), z_dir=(0, 0, -1))):
        with Locations(Location((13.375, 9.5, 0), (0, 0, 180))):
            Circle(SKETCH7_R)
        with Locations(Location((31.375, -8.5, 0), (0, 0, 180))):
            Circle(SKETCH7_R)
    extrude(amount=BOSS_EXTRUDE3_DEPTH)

    # M3x0.5 Tapped Hole2 (through all)
    with Locations(Plane(origin=(0, 0, -2.75), x_dir=(-1, 0, 0), z_dir=(0, 0, -1))):
        with Locations((13.375, 9.5), (31.375, -8.5)):
            CounterSinkHole(M3X0_5_TAPPED_HOLE2_D / 2, M3X0_5_TAPPED_HOLE2_CSINK_D / 2, counter_sink_angle=M3X0_5_TAPPED_HOLE2_CSINK_ANGLE)


solid = part.part
